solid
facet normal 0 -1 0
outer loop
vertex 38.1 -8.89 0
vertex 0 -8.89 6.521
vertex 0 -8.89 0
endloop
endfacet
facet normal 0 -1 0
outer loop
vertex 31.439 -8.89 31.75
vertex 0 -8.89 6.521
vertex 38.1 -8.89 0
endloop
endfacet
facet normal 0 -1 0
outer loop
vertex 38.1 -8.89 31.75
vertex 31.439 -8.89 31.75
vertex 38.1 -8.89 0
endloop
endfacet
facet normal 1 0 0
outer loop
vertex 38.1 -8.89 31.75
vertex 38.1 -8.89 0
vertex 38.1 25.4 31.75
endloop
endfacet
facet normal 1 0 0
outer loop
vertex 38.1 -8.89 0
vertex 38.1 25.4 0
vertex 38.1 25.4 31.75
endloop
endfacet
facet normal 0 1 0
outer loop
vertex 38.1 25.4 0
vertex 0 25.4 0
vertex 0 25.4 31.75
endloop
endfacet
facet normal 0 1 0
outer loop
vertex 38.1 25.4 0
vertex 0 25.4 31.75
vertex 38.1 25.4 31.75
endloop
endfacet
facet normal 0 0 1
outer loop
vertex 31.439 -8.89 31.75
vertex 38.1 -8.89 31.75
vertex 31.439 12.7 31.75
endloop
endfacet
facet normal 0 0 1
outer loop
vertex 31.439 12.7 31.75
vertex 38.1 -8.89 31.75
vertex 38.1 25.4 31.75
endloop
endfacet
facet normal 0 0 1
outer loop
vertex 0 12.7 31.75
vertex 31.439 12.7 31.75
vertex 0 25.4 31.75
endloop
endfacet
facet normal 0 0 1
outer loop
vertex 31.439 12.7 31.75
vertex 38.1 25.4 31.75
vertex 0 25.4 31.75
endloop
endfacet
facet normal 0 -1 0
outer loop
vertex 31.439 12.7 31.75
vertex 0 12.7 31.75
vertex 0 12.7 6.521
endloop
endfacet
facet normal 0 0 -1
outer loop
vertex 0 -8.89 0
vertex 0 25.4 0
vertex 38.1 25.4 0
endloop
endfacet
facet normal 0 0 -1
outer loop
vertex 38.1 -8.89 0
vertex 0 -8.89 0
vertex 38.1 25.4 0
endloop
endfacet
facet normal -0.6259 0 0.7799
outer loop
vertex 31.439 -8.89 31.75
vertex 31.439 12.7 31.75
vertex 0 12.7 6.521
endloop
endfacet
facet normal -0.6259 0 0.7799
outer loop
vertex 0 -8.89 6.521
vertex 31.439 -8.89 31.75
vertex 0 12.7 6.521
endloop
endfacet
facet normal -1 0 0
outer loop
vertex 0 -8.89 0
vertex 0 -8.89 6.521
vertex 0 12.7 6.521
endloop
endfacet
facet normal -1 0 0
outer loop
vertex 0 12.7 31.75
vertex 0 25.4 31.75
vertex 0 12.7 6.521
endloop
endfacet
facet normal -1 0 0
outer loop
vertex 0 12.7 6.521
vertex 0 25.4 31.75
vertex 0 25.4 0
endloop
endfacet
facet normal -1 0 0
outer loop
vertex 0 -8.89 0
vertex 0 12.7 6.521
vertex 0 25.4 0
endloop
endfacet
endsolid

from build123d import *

# Parameters (mm, degrees)
F0_W     = 38.1
F0_H     = 25.4
F2_DEPTH = 31.75
F4_DEPTH = 12.7
F5_DEPTH = 8.89


with BuildPart() as f2:
    # F0 (on Top) → F2 (new body)
    with BuildSketch(Plane.XY):
        with Locations((19.05, 12.7)):
            Rectangle(F0_W, F0_H)
    extrude(amount=F2_DEPTH)

    # F3 (on face) → F4 (cut)
    with BuildSketch(Plane.XZ):
        Polygon((0, 31.75), (0, 6.521496), (31.439457, 31.75), align=None)
    extrude(amount=-F4_DEPTH, mode=Mode.SUBTRACT)

    # F2_face (on face) → F5 (join)
    with BuildSketch(Plane(origin=(19.05, 0, 15.875), x_dir=(1, 0, 0), z_dir=(0, -1, 0))):
        Polygon((-19.05, -15.875), (19.05, -15.875), (19.05, 15.875), (12.389457, 15.875), (-19.05, -9.353504), align=None)
    extrude(amount=F5_DEPTH)


solid = f2.part
